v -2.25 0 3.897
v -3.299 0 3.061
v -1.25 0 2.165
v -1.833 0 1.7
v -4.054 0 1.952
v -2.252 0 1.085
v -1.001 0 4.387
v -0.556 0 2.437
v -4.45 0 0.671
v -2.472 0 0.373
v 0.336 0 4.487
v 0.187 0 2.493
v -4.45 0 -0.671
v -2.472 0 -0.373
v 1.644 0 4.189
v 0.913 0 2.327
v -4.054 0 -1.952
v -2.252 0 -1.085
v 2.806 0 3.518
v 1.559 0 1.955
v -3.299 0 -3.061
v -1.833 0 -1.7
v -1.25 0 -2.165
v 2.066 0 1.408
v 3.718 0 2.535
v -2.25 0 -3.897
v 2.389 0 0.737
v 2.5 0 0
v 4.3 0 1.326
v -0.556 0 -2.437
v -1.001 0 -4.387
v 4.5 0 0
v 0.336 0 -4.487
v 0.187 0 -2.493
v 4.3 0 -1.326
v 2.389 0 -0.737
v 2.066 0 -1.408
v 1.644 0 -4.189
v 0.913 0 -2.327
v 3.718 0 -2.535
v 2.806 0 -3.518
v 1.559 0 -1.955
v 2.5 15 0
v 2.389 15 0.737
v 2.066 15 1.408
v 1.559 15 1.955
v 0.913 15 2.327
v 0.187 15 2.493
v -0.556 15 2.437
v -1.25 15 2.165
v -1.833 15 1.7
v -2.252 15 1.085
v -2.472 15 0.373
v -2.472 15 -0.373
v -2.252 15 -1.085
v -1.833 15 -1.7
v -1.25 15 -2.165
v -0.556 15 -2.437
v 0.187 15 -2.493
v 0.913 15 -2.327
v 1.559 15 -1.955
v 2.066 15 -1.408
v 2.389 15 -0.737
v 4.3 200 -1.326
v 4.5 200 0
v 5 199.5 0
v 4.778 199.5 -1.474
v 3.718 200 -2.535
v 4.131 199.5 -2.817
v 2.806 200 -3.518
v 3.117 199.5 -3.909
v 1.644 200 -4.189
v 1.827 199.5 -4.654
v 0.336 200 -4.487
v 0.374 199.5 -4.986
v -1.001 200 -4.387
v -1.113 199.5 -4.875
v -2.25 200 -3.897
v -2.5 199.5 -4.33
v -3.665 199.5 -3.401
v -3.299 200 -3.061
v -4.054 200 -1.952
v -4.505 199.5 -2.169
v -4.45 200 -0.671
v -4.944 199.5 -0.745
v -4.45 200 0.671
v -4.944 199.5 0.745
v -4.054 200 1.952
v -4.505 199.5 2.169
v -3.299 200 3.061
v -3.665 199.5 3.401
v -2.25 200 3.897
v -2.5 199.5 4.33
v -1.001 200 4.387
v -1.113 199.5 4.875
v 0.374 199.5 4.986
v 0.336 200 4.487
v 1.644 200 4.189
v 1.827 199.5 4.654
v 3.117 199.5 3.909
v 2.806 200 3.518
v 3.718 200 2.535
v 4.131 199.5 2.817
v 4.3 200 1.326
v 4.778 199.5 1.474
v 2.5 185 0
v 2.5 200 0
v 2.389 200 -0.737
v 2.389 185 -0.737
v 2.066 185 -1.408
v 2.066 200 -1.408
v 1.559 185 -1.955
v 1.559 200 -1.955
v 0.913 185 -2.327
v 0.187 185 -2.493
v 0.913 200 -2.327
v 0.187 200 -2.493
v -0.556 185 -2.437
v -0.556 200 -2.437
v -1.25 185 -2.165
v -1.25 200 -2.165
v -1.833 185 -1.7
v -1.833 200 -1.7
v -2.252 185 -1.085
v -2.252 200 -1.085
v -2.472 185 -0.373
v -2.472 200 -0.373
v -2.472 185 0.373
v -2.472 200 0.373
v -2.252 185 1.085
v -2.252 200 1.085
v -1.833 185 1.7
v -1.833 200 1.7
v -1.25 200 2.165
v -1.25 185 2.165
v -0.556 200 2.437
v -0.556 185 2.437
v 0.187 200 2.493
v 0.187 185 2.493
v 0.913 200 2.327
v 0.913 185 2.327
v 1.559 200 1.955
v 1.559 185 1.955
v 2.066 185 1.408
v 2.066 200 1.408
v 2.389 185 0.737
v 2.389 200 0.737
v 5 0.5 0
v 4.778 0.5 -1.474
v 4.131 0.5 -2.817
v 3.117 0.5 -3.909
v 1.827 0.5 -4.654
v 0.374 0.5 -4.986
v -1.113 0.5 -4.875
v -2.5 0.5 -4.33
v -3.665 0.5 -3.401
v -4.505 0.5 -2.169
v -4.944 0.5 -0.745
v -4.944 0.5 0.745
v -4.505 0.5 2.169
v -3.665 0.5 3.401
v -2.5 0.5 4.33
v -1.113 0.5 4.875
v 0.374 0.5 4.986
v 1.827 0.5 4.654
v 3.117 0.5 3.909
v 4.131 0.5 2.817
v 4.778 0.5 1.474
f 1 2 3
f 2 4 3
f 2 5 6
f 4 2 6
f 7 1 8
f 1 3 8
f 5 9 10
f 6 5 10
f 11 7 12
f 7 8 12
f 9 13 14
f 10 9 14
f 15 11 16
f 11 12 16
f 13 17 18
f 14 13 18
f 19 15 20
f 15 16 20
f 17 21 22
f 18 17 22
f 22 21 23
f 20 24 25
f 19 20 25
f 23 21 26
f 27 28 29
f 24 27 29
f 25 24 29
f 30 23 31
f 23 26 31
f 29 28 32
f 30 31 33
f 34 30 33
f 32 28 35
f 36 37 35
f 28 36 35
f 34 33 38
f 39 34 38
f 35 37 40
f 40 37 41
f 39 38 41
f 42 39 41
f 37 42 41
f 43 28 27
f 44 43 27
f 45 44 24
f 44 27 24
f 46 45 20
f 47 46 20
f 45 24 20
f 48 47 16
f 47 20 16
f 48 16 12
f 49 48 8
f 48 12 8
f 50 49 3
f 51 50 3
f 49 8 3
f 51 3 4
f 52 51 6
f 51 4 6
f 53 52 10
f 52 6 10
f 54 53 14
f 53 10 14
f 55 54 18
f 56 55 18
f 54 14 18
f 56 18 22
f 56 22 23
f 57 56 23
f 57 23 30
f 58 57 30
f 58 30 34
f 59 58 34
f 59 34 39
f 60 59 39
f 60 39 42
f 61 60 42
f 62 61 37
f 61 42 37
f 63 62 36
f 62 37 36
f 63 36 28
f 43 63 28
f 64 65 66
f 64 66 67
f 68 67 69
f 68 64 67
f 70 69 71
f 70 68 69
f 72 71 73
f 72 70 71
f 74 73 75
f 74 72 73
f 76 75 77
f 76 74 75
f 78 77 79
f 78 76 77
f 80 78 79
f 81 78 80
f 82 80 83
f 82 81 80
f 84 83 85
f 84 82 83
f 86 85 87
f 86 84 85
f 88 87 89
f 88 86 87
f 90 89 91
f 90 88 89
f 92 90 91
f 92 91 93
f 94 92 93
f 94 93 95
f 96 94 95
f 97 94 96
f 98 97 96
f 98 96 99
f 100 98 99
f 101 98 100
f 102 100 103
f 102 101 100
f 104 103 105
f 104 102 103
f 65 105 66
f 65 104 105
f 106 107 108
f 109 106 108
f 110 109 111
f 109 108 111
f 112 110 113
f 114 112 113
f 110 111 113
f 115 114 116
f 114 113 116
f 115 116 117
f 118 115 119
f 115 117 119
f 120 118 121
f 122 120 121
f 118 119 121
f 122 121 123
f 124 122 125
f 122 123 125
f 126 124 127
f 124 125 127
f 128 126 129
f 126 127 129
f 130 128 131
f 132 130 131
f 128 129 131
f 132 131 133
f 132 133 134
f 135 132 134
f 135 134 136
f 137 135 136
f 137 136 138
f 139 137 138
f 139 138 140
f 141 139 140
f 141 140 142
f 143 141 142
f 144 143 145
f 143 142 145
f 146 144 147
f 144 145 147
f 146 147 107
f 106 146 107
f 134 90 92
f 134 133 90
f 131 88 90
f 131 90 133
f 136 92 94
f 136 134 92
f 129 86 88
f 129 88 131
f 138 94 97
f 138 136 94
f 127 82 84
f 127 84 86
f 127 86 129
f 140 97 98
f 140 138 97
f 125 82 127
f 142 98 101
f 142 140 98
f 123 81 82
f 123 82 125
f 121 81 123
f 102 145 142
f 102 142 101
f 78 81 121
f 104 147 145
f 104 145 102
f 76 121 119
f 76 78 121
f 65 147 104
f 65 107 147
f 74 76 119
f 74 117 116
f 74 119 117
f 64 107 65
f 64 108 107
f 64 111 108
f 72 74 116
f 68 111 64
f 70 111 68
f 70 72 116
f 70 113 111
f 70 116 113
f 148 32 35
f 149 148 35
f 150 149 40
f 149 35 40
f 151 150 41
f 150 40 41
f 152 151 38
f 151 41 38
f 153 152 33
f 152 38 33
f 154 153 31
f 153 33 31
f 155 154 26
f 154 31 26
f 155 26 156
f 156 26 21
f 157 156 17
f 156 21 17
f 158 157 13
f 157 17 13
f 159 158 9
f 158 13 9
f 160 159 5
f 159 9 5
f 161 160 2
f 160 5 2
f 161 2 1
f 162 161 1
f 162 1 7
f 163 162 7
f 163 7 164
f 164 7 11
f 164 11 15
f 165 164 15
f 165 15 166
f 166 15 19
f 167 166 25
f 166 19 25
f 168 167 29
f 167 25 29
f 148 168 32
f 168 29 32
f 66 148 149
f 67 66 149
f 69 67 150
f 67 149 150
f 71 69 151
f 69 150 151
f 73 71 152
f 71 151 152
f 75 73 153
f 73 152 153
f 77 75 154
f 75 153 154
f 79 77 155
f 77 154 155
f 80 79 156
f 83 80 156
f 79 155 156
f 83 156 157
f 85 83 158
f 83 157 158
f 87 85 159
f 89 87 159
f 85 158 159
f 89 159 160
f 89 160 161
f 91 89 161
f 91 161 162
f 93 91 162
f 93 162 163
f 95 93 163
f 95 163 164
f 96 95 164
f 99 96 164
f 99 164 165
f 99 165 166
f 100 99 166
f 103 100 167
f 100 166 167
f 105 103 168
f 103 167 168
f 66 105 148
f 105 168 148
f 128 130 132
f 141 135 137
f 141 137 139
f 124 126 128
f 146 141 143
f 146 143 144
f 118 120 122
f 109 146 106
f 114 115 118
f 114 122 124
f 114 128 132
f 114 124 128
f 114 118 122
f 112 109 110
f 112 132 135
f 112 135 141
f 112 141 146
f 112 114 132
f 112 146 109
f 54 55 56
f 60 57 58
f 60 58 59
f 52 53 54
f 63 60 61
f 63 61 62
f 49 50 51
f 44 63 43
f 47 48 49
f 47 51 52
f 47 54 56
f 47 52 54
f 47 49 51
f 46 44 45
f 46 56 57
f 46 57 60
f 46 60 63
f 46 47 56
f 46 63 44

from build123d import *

# Parameters (mm, degrees)
ESQUISSE1_R      = 5
EXTRUSION1_DEPTH = 200
CHANFREIN1_SIZE  = 0.5
ESQUISSE2_R      = 2.5
EXTRUSION2_DEPTH = 15
ESQUISSE3_R      = 2.5
EXTRUSION3_DEPTH = 15


with BuildPart() as part:
    # Esquisse1 → Extrusion1 (new body)
    with BuildSketch(Plane(origin=(0, 0, 0), x_dir=(1, 0, 0), z_dir=(0, 1, 0))):
        Circle(ESQUISSE1_R)
    extrude(amount=EXTRUSION1_DEPTH)

    # Chanfrein1
    chanfrein1_edges = [part.edges().sort_by_distance(p)[0] for p in [
        (-5, 0, 0),
        (-5, 200, 0),
    ]]
    chamfer(chanfrein1_edges, length=CHANFREIN1_SIZE)

    # Esquisse2 → Extrusion2 (cut)
    with BuildSketch(Plane.XZ):
        Circle(ESQUISSE2_R)
    extrude(amount=-EXTRUSION2_DEPTH, mode=Mode.SUBTRACT)

    # Esquisse3 → Extrusion3 (cut)
    with BuildSketch(Plane(origin=(0, 200, 0), x_dir=(1, 0, 0), z_dir=(0, 1, 0))):
        Circle(ESQUISSE3_R)
    extrude(amount=-EXTRUSION3_DEPTH, mode=Mode.SUBTRACT)


solid = part.part
